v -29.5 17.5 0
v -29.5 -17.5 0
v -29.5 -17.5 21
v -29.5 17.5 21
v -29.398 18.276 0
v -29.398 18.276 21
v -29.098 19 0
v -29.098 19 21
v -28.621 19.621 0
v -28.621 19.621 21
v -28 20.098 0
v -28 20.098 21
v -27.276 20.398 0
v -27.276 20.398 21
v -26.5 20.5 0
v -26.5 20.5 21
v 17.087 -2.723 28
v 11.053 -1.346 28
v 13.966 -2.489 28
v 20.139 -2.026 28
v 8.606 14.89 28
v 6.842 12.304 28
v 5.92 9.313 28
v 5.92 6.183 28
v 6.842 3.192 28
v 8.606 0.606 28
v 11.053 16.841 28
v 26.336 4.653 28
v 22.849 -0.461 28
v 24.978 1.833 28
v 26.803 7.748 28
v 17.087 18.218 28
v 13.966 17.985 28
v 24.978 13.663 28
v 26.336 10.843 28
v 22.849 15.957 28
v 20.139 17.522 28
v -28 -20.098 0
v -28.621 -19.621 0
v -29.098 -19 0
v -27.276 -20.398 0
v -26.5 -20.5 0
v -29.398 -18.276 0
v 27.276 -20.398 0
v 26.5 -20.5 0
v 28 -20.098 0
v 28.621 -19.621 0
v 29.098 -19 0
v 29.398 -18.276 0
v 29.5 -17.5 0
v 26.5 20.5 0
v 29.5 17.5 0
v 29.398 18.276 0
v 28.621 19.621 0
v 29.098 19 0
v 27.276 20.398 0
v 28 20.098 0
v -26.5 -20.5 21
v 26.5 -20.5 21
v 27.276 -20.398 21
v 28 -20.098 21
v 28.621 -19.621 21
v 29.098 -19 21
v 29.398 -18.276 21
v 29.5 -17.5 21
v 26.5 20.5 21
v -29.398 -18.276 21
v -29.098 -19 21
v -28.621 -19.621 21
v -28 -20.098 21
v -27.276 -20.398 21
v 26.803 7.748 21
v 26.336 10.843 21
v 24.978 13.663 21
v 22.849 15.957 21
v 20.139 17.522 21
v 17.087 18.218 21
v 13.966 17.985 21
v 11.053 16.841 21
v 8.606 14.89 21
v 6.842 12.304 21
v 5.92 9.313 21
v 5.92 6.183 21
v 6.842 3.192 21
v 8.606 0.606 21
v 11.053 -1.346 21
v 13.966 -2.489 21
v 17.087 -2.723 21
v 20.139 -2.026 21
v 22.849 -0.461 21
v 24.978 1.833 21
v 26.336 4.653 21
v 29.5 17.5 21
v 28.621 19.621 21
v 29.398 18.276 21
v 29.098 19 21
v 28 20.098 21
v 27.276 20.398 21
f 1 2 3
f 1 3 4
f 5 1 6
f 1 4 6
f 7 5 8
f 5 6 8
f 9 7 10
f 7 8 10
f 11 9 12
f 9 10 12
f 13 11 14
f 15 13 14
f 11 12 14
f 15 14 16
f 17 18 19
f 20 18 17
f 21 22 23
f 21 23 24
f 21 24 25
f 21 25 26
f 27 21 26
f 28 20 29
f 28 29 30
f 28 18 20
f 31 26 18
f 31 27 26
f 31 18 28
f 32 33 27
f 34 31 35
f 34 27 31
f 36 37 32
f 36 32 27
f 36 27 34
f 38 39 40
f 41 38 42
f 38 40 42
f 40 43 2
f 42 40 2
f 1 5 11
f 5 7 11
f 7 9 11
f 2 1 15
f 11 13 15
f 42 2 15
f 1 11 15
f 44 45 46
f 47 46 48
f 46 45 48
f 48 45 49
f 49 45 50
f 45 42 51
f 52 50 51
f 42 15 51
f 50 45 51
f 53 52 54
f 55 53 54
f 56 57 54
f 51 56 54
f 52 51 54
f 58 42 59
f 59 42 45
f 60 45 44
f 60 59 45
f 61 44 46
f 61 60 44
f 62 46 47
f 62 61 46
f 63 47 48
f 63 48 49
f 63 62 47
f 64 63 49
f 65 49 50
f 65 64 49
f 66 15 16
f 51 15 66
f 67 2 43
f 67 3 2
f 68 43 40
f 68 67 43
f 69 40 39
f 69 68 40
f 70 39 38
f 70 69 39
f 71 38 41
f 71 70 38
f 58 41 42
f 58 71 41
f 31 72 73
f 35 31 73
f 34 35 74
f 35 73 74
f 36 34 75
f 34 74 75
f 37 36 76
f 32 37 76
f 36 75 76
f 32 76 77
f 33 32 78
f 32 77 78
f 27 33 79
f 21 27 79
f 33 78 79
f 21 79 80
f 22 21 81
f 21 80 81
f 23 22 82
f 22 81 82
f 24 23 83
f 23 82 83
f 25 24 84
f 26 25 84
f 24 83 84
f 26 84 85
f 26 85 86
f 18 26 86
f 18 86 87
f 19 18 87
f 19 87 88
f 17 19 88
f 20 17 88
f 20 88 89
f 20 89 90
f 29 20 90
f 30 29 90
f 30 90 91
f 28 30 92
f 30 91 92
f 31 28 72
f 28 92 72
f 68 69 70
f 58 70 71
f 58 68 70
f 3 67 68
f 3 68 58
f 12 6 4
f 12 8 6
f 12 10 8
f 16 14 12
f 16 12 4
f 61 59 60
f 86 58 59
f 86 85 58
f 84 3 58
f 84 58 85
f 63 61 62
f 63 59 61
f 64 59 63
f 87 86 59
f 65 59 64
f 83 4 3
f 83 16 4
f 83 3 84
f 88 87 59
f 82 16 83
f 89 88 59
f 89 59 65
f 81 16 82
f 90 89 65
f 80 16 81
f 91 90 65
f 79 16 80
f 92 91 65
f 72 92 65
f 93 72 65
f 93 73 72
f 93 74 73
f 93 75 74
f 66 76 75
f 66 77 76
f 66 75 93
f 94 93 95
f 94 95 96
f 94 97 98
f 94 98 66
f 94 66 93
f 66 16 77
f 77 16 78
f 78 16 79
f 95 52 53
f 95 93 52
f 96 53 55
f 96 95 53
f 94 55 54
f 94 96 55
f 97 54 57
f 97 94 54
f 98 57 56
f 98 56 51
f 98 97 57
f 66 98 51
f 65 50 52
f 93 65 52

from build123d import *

# Parameters (mm, degrees)
F0_W     = 59
F0_H     = 41
F1_DEPTH = 21
F2_R     = 3
F3_R     = 10.5
F4_DEPTH = 7


with BuildPart() as f1:
    # F0 (on Top) → F1 (new body)
    with BuildSketch(Plane.XY):
        Rectangle(F0_W, F0_H)
    extrude(amount=F1_DEPTH)

    # F2
    f2_edges = [f1.edges().sort_by_distance(p)[0] for p in [
        (-29.5, -20.5, 10.5),
        (-29.5, 20.5, 10.5),
        (29.5, -20.5, 10.5),
        (29.5, 20.5, 10.5),
    ]]
    fillet(f2_edges, radius=F2_R)

    # F3 (on face) → F4 (join)
    with BuildSketch(Plane.XY.offset(21)):
        with Locations((16.302584, 7.747762)):
            Circle(F3_R)
    extrude(amount=F4_DEPTH)


solid = f1.part
